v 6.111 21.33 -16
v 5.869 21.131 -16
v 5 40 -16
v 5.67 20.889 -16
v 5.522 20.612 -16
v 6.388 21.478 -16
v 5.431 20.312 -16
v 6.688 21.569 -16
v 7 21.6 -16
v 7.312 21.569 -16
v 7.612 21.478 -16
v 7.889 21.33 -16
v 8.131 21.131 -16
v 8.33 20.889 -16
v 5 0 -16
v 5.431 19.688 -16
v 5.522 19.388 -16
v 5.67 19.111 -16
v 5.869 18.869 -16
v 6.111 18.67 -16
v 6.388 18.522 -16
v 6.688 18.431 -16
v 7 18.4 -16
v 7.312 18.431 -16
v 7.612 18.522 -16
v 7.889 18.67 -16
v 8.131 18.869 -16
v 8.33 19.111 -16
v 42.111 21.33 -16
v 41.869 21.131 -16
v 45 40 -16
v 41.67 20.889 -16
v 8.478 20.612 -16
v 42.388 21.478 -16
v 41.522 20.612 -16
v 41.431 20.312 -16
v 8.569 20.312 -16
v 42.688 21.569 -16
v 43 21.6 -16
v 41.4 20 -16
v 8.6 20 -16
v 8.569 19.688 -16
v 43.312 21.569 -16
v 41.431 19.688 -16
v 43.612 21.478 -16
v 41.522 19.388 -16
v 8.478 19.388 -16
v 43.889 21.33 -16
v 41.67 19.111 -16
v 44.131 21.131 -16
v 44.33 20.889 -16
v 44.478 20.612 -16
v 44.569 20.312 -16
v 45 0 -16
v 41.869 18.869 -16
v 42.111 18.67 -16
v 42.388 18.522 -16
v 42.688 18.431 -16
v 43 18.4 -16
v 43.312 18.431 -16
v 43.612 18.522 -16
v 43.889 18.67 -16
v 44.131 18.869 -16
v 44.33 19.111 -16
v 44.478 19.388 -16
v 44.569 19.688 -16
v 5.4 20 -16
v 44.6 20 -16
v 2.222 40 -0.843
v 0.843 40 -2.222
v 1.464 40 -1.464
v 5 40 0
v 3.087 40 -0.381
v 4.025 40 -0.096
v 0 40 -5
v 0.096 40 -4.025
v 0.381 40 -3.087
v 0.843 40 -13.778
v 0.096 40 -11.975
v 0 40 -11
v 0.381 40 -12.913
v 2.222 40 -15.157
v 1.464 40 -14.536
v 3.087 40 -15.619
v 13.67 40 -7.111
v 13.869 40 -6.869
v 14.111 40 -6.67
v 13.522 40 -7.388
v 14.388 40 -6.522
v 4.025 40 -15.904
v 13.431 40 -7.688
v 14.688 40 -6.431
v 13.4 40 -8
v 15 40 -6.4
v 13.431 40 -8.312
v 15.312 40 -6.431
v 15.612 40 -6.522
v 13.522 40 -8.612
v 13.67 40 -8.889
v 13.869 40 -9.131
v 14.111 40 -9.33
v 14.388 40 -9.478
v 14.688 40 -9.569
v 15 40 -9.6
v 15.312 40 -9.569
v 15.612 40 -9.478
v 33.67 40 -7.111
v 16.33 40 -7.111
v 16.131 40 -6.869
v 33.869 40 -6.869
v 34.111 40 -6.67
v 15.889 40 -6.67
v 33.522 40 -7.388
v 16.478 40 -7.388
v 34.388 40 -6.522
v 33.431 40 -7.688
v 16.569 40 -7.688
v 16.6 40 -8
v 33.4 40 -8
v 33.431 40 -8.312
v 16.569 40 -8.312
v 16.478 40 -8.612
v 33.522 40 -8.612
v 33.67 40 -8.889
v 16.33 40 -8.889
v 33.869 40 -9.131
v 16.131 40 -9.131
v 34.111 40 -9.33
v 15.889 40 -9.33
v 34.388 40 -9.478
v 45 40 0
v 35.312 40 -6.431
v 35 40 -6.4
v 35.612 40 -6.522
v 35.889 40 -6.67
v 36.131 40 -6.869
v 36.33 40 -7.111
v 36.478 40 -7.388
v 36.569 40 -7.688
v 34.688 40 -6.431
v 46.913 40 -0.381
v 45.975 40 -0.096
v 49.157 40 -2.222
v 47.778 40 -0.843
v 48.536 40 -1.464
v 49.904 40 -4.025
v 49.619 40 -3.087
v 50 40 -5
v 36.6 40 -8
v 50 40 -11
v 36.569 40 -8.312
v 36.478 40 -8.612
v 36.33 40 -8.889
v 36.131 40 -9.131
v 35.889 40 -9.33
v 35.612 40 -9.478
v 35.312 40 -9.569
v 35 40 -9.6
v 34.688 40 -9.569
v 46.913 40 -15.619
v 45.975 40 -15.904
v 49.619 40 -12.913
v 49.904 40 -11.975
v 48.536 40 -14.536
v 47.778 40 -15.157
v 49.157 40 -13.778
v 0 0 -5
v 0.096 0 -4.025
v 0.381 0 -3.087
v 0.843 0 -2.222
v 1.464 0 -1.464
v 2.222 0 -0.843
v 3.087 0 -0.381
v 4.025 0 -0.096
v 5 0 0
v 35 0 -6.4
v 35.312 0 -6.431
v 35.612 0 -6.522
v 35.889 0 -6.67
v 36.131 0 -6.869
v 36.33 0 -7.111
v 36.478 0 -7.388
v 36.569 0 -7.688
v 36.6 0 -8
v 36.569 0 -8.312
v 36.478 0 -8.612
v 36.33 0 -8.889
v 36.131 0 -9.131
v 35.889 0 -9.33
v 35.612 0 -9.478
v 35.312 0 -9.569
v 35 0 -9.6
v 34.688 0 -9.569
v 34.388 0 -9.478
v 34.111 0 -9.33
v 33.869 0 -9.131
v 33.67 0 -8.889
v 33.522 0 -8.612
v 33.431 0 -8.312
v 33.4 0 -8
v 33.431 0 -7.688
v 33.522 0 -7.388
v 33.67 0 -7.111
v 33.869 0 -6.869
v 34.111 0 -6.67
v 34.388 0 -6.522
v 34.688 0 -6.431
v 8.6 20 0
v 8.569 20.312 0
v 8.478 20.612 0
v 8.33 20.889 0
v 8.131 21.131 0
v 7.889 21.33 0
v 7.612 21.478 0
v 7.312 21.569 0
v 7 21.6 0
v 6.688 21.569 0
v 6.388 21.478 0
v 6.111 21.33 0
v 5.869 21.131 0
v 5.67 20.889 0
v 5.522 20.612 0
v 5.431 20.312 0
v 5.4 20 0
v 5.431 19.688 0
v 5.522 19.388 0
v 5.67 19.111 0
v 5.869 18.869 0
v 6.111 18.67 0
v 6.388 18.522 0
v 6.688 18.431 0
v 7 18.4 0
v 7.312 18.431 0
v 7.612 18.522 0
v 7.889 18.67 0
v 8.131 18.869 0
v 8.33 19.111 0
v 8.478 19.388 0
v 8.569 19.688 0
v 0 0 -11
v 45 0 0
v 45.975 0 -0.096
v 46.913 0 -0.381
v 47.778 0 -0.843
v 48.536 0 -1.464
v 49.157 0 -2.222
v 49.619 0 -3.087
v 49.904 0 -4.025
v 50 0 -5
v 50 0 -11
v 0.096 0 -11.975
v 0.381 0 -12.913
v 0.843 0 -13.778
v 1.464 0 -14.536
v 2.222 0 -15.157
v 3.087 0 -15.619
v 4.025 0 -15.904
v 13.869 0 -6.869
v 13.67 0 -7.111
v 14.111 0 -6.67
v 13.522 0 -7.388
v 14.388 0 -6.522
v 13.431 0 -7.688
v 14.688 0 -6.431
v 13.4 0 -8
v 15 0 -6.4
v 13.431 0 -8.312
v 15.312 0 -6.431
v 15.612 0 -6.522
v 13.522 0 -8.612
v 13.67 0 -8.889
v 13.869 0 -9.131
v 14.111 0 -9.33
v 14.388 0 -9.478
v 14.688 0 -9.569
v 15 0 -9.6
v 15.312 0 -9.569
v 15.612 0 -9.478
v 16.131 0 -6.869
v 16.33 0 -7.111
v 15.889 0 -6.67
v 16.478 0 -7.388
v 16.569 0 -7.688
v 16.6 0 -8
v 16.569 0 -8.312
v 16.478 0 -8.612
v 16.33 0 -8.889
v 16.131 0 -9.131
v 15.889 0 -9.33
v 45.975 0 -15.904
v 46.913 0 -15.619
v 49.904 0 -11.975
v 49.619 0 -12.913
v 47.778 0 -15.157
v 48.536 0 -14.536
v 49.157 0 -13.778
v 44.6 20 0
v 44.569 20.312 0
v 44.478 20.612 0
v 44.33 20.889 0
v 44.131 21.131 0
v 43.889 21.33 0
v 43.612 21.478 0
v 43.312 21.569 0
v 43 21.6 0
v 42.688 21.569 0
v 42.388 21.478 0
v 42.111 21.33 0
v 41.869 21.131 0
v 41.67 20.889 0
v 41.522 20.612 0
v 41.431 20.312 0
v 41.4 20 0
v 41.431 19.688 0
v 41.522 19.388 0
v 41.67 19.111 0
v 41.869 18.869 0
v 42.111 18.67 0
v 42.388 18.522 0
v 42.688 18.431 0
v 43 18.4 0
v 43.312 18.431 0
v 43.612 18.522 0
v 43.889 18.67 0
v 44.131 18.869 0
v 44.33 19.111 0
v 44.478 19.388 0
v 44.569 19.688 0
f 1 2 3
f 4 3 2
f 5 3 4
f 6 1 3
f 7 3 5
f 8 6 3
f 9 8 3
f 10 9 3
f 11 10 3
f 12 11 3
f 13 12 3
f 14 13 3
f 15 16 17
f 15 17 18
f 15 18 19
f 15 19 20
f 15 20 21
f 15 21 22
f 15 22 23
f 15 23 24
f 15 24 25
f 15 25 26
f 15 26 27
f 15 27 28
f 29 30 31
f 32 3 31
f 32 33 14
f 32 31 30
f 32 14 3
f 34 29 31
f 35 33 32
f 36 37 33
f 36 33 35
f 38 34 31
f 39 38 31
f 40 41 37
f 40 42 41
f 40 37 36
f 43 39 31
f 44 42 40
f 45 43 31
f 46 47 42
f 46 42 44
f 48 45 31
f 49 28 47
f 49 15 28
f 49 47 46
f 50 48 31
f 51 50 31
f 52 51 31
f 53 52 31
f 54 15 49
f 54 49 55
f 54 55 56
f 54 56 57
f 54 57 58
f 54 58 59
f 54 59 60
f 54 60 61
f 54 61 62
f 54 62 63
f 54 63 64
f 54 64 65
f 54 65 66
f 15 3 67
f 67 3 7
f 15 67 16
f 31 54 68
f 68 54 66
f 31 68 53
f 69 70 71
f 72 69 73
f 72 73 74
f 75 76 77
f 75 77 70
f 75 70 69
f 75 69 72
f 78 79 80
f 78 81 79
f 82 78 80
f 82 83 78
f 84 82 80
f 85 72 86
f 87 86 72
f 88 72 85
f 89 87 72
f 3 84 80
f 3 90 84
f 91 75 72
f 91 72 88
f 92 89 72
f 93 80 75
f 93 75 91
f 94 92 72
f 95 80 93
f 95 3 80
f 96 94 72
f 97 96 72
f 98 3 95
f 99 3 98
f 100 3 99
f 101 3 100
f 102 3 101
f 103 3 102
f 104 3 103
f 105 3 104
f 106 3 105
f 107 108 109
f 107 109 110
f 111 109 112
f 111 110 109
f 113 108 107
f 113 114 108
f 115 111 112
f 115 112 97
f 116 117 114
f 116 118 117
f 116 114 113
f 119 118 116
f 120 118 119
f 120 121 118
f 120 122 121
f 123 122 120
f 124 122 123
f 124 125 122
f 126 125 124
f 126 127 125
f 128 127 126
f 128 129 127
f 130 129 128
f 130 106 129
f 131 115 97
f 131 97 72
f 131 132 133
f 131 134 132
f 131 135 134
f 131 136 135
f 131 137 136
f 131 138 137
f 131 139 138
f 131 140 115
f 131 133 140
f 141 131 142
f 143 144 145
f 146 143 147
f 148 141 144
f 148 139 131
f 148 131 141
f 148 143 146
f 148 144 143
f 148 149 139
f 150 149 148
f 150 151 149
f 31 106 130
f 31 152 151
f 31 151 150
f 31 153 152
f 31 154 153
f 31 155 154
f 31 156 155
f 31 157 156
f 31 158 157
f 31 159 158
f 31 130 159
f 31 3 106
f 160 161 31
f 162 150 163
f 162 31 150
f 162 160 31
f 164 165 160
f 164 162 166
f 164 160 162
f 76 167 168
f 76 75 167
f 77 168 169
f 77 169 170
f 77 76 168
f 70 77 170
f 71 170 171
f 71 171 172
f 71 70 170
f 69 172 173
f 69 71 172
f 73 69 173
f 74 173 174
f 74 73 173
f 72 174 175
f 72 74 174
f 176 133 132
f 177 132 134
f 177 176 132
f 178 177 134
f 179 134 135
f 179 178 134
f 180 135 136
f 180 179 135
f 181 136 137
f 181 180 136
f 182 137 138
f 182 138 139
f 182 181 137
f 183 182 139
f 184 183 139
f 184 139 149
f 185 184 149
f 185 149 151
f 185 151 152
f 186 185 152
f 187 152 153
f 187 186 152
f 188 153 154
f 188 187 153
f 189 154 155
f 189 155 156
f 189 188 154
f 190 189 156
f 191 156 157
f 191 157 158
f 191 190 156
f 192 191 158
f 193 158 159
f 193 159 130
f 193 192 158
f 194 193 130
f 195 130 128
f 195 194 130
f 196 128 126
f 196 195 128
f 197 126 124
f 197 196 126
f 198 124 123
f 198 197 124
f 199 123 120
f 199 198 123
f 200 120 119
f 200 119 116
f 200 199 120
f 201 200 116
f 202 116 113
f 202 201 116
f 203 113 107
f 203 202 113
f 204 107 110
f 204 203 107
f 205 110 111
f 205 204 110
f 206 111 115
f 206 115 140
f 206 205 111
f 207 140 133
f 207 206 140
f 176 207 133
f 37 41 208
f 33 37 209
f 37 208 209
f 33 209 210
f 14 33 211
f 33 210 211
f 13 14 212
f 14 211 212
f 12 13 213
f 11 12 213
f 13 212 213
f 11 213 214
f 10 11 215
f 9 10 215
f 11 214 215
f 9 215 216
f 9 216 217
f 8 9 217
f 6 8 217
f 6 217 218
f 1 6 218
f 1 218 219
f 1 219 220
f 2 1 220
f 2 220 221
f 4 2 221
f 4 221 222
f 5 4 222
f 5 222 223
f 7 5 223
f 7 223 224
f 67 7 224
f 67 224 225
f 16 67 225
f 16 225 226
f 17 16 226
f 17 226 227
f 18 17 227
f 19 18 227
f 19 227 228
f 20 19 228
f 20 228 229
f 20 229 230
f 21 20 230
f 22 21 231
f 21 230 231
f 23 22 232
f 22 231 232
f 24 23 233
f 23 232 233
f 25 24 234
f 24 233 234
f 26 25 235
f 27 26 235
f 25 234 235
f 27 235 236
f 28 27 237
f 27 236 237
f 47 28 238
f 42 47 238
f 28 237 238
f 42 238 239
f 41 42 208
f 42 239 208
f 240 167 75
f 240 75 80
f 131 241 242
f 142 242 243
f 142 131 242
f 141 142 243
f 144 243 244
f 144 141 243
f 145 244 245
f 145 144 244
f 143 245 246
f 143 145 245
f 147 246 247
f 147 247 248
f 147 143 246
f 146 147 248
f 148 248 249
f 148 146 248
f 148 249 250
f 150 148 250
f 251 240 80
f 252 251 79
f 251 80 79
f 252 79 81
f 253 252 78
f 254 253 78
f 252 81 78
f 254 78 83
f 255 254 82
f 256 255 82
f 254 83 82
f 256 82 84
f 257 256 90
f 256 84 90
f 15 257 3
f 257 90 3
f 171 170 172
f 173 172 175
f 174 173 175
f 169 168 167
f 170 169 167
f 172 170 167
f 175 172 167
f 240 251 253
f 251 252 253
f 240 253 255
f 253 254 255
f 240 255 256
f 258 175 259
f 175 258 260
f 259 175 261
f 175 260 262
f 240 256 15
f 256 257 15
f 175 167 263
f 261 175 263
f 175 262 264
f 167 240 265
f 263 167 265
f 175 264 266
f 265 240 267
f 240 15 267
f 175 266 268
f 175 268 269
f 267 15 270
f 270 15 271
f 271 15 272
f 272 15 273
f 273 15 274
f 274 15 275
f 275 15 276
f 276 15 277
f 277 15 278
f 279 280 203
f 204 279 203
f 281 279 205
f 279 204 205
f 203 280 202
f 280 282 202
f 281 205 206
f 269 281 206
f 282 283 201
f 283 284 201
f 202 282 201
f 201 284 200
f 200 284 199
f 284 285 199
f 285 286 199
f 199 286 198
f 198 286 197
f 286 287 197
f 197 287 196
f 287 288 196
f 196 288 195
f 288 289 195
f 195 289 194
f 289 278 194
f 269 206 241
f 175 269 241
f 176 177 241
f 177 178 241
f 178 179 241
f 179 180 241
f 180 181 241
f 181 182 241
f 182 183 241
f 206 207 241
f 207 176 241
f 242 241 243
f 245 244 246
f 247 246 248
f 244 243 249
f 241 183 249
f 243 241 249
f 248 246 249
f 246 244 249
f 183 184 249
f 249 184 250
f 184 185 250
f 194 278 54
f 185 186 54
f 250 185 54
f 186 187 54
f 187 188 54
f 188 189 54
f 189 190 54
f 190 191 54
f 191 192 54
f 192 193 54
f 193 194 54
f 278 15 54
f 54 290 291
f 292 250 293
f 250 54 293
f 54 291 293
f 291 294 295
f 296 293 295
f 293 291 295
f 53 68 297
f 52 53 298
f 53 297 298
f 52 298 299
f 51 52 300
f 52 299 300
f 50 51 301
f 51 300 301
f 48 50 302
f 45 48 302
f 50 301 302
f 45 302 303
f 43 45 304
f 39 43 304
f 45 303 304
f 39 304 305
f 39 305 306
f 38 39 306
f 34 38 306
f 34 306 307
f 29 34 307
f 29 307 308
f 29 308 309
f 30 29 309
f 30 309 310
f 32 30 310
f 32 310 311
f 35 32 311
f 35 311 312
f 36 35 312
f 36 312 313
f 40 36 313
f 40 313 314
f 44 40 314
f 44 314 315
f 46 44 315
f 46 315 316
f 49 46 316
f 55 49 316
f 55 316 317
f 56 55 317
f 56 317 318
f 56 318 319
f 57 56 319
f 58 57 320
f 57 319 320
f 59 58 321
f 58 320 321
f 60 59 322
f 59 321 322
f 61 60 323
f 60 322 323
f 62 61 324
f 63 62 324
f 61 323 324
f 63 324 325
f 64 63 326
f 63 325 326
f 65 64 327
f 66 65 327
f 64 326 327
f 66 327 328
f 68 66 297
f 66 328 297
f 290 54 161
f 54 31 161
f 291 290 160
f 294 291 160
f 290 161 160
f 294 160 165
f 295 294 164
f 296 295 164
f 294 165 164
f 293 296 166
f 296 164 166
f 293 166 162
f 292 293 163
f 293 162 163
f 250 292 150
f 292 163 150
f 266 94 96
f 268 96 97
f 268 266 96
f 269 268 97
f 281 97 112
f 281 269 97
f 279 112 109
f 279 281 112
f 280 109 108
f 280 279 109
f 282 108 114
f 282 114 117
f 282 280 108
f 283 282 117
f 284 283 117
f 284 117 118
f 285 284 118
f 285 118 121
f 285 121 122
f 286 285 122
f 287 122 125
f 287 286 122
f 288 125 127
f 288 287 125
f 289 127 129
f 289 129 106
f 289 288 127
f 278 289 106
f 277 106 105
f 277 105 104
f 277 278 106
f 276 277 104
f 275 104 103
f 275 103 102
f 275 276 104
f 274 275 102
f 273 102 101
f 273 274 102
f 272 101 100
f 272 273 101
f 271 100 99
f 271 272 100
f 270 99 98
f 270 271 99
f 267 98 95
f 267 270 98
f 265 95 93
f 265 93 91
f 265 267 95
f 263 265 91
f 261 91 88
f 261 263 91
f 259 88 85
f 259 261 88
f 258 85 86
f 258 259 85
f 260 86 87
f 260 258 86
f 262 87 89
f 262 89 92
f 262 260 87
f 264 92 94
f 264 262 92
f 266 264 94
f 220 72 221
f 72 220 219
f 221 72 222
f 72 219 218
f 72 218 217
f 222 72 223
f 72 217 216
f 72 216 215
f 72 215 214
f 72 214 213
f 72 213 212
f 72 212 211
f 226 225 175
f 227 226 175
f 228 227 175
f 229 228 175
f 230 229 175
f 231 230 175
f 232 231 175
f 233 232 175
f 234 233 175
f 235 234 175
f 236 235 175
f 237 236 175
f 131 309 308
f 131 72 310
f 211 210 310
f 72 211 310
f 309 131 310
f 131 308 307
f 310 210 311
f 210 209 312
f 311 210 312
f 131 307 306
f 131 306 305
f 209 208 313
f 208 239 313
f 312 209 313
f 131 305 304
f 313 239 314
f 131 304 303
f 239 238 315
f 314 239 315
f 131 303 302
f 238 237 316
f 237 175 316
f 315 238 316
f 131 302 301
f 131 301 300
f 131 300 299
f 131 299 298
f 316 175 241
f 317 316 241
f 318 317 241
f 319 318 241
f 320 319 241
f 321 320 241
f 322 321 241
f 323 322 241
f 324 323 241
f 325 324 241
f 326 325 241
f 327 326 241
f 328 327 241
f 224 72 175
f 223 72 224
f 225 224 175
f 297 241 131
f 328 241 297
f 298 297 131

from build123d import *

# Parameters (mm, degrees)
SKETCH1_W           = 50
SKETCH1_H           = 16
SKETCH1_R           = 1.6
BOSS_EXTRUDE1_DEPTH = 40
SKETCH2_R           = 1.6
CUT_EXTRUDE1_DEPTH  = 67
FILLET1_R           = 5


with BuildPart() as part:
    # Sketch1 → Boss-Extrude1 (new body)
    with BuildSketch(Plane(origin=(0, 0, 0), x_dir=(1, 0, 0), z_dir=(0, 1, 0))):
        with Locations((25, 8)):
            Rectangle(SKETCH1_W, SKETCH1_H)
        with Locations(Location((15, 8, 0), (0, 0, 270))):
            Circle(SKETCH1_R, mode=Mode.SUBTRACT)
        with Locations(Location((35, 8, 0), (0, 0, 270))):
            Circle(SKETCH1_R, mode=Mode.SUBTRACT)
    extrude(amount=BOSS_EXTRUDE1_DEPTH)

    # Sketch2 → Cut-Extrude1 (cut, through all)
    with BuildSketch(Plane.XY):
        with Locations((7, 20)):
            Circle(SKETCH2_R)
        with Locations((43, 20)):
            Circle(SKETCH2_R)
    extrude(amount=-CUT_EXTRUDE1_DEPTH, mode=Mode.SUBTRACT)

    # Fillet1
    fillet1_edges = [part.edges().sort_by_distance(p)[0] for p in [
        (0, 20, -16),
        (50, 20, -16),
        (50, 20, 0),
        (0, 20, 0),
    ]]
    fillet(fillet1_edges, radius=FILLET1_R)


solid = part.part
